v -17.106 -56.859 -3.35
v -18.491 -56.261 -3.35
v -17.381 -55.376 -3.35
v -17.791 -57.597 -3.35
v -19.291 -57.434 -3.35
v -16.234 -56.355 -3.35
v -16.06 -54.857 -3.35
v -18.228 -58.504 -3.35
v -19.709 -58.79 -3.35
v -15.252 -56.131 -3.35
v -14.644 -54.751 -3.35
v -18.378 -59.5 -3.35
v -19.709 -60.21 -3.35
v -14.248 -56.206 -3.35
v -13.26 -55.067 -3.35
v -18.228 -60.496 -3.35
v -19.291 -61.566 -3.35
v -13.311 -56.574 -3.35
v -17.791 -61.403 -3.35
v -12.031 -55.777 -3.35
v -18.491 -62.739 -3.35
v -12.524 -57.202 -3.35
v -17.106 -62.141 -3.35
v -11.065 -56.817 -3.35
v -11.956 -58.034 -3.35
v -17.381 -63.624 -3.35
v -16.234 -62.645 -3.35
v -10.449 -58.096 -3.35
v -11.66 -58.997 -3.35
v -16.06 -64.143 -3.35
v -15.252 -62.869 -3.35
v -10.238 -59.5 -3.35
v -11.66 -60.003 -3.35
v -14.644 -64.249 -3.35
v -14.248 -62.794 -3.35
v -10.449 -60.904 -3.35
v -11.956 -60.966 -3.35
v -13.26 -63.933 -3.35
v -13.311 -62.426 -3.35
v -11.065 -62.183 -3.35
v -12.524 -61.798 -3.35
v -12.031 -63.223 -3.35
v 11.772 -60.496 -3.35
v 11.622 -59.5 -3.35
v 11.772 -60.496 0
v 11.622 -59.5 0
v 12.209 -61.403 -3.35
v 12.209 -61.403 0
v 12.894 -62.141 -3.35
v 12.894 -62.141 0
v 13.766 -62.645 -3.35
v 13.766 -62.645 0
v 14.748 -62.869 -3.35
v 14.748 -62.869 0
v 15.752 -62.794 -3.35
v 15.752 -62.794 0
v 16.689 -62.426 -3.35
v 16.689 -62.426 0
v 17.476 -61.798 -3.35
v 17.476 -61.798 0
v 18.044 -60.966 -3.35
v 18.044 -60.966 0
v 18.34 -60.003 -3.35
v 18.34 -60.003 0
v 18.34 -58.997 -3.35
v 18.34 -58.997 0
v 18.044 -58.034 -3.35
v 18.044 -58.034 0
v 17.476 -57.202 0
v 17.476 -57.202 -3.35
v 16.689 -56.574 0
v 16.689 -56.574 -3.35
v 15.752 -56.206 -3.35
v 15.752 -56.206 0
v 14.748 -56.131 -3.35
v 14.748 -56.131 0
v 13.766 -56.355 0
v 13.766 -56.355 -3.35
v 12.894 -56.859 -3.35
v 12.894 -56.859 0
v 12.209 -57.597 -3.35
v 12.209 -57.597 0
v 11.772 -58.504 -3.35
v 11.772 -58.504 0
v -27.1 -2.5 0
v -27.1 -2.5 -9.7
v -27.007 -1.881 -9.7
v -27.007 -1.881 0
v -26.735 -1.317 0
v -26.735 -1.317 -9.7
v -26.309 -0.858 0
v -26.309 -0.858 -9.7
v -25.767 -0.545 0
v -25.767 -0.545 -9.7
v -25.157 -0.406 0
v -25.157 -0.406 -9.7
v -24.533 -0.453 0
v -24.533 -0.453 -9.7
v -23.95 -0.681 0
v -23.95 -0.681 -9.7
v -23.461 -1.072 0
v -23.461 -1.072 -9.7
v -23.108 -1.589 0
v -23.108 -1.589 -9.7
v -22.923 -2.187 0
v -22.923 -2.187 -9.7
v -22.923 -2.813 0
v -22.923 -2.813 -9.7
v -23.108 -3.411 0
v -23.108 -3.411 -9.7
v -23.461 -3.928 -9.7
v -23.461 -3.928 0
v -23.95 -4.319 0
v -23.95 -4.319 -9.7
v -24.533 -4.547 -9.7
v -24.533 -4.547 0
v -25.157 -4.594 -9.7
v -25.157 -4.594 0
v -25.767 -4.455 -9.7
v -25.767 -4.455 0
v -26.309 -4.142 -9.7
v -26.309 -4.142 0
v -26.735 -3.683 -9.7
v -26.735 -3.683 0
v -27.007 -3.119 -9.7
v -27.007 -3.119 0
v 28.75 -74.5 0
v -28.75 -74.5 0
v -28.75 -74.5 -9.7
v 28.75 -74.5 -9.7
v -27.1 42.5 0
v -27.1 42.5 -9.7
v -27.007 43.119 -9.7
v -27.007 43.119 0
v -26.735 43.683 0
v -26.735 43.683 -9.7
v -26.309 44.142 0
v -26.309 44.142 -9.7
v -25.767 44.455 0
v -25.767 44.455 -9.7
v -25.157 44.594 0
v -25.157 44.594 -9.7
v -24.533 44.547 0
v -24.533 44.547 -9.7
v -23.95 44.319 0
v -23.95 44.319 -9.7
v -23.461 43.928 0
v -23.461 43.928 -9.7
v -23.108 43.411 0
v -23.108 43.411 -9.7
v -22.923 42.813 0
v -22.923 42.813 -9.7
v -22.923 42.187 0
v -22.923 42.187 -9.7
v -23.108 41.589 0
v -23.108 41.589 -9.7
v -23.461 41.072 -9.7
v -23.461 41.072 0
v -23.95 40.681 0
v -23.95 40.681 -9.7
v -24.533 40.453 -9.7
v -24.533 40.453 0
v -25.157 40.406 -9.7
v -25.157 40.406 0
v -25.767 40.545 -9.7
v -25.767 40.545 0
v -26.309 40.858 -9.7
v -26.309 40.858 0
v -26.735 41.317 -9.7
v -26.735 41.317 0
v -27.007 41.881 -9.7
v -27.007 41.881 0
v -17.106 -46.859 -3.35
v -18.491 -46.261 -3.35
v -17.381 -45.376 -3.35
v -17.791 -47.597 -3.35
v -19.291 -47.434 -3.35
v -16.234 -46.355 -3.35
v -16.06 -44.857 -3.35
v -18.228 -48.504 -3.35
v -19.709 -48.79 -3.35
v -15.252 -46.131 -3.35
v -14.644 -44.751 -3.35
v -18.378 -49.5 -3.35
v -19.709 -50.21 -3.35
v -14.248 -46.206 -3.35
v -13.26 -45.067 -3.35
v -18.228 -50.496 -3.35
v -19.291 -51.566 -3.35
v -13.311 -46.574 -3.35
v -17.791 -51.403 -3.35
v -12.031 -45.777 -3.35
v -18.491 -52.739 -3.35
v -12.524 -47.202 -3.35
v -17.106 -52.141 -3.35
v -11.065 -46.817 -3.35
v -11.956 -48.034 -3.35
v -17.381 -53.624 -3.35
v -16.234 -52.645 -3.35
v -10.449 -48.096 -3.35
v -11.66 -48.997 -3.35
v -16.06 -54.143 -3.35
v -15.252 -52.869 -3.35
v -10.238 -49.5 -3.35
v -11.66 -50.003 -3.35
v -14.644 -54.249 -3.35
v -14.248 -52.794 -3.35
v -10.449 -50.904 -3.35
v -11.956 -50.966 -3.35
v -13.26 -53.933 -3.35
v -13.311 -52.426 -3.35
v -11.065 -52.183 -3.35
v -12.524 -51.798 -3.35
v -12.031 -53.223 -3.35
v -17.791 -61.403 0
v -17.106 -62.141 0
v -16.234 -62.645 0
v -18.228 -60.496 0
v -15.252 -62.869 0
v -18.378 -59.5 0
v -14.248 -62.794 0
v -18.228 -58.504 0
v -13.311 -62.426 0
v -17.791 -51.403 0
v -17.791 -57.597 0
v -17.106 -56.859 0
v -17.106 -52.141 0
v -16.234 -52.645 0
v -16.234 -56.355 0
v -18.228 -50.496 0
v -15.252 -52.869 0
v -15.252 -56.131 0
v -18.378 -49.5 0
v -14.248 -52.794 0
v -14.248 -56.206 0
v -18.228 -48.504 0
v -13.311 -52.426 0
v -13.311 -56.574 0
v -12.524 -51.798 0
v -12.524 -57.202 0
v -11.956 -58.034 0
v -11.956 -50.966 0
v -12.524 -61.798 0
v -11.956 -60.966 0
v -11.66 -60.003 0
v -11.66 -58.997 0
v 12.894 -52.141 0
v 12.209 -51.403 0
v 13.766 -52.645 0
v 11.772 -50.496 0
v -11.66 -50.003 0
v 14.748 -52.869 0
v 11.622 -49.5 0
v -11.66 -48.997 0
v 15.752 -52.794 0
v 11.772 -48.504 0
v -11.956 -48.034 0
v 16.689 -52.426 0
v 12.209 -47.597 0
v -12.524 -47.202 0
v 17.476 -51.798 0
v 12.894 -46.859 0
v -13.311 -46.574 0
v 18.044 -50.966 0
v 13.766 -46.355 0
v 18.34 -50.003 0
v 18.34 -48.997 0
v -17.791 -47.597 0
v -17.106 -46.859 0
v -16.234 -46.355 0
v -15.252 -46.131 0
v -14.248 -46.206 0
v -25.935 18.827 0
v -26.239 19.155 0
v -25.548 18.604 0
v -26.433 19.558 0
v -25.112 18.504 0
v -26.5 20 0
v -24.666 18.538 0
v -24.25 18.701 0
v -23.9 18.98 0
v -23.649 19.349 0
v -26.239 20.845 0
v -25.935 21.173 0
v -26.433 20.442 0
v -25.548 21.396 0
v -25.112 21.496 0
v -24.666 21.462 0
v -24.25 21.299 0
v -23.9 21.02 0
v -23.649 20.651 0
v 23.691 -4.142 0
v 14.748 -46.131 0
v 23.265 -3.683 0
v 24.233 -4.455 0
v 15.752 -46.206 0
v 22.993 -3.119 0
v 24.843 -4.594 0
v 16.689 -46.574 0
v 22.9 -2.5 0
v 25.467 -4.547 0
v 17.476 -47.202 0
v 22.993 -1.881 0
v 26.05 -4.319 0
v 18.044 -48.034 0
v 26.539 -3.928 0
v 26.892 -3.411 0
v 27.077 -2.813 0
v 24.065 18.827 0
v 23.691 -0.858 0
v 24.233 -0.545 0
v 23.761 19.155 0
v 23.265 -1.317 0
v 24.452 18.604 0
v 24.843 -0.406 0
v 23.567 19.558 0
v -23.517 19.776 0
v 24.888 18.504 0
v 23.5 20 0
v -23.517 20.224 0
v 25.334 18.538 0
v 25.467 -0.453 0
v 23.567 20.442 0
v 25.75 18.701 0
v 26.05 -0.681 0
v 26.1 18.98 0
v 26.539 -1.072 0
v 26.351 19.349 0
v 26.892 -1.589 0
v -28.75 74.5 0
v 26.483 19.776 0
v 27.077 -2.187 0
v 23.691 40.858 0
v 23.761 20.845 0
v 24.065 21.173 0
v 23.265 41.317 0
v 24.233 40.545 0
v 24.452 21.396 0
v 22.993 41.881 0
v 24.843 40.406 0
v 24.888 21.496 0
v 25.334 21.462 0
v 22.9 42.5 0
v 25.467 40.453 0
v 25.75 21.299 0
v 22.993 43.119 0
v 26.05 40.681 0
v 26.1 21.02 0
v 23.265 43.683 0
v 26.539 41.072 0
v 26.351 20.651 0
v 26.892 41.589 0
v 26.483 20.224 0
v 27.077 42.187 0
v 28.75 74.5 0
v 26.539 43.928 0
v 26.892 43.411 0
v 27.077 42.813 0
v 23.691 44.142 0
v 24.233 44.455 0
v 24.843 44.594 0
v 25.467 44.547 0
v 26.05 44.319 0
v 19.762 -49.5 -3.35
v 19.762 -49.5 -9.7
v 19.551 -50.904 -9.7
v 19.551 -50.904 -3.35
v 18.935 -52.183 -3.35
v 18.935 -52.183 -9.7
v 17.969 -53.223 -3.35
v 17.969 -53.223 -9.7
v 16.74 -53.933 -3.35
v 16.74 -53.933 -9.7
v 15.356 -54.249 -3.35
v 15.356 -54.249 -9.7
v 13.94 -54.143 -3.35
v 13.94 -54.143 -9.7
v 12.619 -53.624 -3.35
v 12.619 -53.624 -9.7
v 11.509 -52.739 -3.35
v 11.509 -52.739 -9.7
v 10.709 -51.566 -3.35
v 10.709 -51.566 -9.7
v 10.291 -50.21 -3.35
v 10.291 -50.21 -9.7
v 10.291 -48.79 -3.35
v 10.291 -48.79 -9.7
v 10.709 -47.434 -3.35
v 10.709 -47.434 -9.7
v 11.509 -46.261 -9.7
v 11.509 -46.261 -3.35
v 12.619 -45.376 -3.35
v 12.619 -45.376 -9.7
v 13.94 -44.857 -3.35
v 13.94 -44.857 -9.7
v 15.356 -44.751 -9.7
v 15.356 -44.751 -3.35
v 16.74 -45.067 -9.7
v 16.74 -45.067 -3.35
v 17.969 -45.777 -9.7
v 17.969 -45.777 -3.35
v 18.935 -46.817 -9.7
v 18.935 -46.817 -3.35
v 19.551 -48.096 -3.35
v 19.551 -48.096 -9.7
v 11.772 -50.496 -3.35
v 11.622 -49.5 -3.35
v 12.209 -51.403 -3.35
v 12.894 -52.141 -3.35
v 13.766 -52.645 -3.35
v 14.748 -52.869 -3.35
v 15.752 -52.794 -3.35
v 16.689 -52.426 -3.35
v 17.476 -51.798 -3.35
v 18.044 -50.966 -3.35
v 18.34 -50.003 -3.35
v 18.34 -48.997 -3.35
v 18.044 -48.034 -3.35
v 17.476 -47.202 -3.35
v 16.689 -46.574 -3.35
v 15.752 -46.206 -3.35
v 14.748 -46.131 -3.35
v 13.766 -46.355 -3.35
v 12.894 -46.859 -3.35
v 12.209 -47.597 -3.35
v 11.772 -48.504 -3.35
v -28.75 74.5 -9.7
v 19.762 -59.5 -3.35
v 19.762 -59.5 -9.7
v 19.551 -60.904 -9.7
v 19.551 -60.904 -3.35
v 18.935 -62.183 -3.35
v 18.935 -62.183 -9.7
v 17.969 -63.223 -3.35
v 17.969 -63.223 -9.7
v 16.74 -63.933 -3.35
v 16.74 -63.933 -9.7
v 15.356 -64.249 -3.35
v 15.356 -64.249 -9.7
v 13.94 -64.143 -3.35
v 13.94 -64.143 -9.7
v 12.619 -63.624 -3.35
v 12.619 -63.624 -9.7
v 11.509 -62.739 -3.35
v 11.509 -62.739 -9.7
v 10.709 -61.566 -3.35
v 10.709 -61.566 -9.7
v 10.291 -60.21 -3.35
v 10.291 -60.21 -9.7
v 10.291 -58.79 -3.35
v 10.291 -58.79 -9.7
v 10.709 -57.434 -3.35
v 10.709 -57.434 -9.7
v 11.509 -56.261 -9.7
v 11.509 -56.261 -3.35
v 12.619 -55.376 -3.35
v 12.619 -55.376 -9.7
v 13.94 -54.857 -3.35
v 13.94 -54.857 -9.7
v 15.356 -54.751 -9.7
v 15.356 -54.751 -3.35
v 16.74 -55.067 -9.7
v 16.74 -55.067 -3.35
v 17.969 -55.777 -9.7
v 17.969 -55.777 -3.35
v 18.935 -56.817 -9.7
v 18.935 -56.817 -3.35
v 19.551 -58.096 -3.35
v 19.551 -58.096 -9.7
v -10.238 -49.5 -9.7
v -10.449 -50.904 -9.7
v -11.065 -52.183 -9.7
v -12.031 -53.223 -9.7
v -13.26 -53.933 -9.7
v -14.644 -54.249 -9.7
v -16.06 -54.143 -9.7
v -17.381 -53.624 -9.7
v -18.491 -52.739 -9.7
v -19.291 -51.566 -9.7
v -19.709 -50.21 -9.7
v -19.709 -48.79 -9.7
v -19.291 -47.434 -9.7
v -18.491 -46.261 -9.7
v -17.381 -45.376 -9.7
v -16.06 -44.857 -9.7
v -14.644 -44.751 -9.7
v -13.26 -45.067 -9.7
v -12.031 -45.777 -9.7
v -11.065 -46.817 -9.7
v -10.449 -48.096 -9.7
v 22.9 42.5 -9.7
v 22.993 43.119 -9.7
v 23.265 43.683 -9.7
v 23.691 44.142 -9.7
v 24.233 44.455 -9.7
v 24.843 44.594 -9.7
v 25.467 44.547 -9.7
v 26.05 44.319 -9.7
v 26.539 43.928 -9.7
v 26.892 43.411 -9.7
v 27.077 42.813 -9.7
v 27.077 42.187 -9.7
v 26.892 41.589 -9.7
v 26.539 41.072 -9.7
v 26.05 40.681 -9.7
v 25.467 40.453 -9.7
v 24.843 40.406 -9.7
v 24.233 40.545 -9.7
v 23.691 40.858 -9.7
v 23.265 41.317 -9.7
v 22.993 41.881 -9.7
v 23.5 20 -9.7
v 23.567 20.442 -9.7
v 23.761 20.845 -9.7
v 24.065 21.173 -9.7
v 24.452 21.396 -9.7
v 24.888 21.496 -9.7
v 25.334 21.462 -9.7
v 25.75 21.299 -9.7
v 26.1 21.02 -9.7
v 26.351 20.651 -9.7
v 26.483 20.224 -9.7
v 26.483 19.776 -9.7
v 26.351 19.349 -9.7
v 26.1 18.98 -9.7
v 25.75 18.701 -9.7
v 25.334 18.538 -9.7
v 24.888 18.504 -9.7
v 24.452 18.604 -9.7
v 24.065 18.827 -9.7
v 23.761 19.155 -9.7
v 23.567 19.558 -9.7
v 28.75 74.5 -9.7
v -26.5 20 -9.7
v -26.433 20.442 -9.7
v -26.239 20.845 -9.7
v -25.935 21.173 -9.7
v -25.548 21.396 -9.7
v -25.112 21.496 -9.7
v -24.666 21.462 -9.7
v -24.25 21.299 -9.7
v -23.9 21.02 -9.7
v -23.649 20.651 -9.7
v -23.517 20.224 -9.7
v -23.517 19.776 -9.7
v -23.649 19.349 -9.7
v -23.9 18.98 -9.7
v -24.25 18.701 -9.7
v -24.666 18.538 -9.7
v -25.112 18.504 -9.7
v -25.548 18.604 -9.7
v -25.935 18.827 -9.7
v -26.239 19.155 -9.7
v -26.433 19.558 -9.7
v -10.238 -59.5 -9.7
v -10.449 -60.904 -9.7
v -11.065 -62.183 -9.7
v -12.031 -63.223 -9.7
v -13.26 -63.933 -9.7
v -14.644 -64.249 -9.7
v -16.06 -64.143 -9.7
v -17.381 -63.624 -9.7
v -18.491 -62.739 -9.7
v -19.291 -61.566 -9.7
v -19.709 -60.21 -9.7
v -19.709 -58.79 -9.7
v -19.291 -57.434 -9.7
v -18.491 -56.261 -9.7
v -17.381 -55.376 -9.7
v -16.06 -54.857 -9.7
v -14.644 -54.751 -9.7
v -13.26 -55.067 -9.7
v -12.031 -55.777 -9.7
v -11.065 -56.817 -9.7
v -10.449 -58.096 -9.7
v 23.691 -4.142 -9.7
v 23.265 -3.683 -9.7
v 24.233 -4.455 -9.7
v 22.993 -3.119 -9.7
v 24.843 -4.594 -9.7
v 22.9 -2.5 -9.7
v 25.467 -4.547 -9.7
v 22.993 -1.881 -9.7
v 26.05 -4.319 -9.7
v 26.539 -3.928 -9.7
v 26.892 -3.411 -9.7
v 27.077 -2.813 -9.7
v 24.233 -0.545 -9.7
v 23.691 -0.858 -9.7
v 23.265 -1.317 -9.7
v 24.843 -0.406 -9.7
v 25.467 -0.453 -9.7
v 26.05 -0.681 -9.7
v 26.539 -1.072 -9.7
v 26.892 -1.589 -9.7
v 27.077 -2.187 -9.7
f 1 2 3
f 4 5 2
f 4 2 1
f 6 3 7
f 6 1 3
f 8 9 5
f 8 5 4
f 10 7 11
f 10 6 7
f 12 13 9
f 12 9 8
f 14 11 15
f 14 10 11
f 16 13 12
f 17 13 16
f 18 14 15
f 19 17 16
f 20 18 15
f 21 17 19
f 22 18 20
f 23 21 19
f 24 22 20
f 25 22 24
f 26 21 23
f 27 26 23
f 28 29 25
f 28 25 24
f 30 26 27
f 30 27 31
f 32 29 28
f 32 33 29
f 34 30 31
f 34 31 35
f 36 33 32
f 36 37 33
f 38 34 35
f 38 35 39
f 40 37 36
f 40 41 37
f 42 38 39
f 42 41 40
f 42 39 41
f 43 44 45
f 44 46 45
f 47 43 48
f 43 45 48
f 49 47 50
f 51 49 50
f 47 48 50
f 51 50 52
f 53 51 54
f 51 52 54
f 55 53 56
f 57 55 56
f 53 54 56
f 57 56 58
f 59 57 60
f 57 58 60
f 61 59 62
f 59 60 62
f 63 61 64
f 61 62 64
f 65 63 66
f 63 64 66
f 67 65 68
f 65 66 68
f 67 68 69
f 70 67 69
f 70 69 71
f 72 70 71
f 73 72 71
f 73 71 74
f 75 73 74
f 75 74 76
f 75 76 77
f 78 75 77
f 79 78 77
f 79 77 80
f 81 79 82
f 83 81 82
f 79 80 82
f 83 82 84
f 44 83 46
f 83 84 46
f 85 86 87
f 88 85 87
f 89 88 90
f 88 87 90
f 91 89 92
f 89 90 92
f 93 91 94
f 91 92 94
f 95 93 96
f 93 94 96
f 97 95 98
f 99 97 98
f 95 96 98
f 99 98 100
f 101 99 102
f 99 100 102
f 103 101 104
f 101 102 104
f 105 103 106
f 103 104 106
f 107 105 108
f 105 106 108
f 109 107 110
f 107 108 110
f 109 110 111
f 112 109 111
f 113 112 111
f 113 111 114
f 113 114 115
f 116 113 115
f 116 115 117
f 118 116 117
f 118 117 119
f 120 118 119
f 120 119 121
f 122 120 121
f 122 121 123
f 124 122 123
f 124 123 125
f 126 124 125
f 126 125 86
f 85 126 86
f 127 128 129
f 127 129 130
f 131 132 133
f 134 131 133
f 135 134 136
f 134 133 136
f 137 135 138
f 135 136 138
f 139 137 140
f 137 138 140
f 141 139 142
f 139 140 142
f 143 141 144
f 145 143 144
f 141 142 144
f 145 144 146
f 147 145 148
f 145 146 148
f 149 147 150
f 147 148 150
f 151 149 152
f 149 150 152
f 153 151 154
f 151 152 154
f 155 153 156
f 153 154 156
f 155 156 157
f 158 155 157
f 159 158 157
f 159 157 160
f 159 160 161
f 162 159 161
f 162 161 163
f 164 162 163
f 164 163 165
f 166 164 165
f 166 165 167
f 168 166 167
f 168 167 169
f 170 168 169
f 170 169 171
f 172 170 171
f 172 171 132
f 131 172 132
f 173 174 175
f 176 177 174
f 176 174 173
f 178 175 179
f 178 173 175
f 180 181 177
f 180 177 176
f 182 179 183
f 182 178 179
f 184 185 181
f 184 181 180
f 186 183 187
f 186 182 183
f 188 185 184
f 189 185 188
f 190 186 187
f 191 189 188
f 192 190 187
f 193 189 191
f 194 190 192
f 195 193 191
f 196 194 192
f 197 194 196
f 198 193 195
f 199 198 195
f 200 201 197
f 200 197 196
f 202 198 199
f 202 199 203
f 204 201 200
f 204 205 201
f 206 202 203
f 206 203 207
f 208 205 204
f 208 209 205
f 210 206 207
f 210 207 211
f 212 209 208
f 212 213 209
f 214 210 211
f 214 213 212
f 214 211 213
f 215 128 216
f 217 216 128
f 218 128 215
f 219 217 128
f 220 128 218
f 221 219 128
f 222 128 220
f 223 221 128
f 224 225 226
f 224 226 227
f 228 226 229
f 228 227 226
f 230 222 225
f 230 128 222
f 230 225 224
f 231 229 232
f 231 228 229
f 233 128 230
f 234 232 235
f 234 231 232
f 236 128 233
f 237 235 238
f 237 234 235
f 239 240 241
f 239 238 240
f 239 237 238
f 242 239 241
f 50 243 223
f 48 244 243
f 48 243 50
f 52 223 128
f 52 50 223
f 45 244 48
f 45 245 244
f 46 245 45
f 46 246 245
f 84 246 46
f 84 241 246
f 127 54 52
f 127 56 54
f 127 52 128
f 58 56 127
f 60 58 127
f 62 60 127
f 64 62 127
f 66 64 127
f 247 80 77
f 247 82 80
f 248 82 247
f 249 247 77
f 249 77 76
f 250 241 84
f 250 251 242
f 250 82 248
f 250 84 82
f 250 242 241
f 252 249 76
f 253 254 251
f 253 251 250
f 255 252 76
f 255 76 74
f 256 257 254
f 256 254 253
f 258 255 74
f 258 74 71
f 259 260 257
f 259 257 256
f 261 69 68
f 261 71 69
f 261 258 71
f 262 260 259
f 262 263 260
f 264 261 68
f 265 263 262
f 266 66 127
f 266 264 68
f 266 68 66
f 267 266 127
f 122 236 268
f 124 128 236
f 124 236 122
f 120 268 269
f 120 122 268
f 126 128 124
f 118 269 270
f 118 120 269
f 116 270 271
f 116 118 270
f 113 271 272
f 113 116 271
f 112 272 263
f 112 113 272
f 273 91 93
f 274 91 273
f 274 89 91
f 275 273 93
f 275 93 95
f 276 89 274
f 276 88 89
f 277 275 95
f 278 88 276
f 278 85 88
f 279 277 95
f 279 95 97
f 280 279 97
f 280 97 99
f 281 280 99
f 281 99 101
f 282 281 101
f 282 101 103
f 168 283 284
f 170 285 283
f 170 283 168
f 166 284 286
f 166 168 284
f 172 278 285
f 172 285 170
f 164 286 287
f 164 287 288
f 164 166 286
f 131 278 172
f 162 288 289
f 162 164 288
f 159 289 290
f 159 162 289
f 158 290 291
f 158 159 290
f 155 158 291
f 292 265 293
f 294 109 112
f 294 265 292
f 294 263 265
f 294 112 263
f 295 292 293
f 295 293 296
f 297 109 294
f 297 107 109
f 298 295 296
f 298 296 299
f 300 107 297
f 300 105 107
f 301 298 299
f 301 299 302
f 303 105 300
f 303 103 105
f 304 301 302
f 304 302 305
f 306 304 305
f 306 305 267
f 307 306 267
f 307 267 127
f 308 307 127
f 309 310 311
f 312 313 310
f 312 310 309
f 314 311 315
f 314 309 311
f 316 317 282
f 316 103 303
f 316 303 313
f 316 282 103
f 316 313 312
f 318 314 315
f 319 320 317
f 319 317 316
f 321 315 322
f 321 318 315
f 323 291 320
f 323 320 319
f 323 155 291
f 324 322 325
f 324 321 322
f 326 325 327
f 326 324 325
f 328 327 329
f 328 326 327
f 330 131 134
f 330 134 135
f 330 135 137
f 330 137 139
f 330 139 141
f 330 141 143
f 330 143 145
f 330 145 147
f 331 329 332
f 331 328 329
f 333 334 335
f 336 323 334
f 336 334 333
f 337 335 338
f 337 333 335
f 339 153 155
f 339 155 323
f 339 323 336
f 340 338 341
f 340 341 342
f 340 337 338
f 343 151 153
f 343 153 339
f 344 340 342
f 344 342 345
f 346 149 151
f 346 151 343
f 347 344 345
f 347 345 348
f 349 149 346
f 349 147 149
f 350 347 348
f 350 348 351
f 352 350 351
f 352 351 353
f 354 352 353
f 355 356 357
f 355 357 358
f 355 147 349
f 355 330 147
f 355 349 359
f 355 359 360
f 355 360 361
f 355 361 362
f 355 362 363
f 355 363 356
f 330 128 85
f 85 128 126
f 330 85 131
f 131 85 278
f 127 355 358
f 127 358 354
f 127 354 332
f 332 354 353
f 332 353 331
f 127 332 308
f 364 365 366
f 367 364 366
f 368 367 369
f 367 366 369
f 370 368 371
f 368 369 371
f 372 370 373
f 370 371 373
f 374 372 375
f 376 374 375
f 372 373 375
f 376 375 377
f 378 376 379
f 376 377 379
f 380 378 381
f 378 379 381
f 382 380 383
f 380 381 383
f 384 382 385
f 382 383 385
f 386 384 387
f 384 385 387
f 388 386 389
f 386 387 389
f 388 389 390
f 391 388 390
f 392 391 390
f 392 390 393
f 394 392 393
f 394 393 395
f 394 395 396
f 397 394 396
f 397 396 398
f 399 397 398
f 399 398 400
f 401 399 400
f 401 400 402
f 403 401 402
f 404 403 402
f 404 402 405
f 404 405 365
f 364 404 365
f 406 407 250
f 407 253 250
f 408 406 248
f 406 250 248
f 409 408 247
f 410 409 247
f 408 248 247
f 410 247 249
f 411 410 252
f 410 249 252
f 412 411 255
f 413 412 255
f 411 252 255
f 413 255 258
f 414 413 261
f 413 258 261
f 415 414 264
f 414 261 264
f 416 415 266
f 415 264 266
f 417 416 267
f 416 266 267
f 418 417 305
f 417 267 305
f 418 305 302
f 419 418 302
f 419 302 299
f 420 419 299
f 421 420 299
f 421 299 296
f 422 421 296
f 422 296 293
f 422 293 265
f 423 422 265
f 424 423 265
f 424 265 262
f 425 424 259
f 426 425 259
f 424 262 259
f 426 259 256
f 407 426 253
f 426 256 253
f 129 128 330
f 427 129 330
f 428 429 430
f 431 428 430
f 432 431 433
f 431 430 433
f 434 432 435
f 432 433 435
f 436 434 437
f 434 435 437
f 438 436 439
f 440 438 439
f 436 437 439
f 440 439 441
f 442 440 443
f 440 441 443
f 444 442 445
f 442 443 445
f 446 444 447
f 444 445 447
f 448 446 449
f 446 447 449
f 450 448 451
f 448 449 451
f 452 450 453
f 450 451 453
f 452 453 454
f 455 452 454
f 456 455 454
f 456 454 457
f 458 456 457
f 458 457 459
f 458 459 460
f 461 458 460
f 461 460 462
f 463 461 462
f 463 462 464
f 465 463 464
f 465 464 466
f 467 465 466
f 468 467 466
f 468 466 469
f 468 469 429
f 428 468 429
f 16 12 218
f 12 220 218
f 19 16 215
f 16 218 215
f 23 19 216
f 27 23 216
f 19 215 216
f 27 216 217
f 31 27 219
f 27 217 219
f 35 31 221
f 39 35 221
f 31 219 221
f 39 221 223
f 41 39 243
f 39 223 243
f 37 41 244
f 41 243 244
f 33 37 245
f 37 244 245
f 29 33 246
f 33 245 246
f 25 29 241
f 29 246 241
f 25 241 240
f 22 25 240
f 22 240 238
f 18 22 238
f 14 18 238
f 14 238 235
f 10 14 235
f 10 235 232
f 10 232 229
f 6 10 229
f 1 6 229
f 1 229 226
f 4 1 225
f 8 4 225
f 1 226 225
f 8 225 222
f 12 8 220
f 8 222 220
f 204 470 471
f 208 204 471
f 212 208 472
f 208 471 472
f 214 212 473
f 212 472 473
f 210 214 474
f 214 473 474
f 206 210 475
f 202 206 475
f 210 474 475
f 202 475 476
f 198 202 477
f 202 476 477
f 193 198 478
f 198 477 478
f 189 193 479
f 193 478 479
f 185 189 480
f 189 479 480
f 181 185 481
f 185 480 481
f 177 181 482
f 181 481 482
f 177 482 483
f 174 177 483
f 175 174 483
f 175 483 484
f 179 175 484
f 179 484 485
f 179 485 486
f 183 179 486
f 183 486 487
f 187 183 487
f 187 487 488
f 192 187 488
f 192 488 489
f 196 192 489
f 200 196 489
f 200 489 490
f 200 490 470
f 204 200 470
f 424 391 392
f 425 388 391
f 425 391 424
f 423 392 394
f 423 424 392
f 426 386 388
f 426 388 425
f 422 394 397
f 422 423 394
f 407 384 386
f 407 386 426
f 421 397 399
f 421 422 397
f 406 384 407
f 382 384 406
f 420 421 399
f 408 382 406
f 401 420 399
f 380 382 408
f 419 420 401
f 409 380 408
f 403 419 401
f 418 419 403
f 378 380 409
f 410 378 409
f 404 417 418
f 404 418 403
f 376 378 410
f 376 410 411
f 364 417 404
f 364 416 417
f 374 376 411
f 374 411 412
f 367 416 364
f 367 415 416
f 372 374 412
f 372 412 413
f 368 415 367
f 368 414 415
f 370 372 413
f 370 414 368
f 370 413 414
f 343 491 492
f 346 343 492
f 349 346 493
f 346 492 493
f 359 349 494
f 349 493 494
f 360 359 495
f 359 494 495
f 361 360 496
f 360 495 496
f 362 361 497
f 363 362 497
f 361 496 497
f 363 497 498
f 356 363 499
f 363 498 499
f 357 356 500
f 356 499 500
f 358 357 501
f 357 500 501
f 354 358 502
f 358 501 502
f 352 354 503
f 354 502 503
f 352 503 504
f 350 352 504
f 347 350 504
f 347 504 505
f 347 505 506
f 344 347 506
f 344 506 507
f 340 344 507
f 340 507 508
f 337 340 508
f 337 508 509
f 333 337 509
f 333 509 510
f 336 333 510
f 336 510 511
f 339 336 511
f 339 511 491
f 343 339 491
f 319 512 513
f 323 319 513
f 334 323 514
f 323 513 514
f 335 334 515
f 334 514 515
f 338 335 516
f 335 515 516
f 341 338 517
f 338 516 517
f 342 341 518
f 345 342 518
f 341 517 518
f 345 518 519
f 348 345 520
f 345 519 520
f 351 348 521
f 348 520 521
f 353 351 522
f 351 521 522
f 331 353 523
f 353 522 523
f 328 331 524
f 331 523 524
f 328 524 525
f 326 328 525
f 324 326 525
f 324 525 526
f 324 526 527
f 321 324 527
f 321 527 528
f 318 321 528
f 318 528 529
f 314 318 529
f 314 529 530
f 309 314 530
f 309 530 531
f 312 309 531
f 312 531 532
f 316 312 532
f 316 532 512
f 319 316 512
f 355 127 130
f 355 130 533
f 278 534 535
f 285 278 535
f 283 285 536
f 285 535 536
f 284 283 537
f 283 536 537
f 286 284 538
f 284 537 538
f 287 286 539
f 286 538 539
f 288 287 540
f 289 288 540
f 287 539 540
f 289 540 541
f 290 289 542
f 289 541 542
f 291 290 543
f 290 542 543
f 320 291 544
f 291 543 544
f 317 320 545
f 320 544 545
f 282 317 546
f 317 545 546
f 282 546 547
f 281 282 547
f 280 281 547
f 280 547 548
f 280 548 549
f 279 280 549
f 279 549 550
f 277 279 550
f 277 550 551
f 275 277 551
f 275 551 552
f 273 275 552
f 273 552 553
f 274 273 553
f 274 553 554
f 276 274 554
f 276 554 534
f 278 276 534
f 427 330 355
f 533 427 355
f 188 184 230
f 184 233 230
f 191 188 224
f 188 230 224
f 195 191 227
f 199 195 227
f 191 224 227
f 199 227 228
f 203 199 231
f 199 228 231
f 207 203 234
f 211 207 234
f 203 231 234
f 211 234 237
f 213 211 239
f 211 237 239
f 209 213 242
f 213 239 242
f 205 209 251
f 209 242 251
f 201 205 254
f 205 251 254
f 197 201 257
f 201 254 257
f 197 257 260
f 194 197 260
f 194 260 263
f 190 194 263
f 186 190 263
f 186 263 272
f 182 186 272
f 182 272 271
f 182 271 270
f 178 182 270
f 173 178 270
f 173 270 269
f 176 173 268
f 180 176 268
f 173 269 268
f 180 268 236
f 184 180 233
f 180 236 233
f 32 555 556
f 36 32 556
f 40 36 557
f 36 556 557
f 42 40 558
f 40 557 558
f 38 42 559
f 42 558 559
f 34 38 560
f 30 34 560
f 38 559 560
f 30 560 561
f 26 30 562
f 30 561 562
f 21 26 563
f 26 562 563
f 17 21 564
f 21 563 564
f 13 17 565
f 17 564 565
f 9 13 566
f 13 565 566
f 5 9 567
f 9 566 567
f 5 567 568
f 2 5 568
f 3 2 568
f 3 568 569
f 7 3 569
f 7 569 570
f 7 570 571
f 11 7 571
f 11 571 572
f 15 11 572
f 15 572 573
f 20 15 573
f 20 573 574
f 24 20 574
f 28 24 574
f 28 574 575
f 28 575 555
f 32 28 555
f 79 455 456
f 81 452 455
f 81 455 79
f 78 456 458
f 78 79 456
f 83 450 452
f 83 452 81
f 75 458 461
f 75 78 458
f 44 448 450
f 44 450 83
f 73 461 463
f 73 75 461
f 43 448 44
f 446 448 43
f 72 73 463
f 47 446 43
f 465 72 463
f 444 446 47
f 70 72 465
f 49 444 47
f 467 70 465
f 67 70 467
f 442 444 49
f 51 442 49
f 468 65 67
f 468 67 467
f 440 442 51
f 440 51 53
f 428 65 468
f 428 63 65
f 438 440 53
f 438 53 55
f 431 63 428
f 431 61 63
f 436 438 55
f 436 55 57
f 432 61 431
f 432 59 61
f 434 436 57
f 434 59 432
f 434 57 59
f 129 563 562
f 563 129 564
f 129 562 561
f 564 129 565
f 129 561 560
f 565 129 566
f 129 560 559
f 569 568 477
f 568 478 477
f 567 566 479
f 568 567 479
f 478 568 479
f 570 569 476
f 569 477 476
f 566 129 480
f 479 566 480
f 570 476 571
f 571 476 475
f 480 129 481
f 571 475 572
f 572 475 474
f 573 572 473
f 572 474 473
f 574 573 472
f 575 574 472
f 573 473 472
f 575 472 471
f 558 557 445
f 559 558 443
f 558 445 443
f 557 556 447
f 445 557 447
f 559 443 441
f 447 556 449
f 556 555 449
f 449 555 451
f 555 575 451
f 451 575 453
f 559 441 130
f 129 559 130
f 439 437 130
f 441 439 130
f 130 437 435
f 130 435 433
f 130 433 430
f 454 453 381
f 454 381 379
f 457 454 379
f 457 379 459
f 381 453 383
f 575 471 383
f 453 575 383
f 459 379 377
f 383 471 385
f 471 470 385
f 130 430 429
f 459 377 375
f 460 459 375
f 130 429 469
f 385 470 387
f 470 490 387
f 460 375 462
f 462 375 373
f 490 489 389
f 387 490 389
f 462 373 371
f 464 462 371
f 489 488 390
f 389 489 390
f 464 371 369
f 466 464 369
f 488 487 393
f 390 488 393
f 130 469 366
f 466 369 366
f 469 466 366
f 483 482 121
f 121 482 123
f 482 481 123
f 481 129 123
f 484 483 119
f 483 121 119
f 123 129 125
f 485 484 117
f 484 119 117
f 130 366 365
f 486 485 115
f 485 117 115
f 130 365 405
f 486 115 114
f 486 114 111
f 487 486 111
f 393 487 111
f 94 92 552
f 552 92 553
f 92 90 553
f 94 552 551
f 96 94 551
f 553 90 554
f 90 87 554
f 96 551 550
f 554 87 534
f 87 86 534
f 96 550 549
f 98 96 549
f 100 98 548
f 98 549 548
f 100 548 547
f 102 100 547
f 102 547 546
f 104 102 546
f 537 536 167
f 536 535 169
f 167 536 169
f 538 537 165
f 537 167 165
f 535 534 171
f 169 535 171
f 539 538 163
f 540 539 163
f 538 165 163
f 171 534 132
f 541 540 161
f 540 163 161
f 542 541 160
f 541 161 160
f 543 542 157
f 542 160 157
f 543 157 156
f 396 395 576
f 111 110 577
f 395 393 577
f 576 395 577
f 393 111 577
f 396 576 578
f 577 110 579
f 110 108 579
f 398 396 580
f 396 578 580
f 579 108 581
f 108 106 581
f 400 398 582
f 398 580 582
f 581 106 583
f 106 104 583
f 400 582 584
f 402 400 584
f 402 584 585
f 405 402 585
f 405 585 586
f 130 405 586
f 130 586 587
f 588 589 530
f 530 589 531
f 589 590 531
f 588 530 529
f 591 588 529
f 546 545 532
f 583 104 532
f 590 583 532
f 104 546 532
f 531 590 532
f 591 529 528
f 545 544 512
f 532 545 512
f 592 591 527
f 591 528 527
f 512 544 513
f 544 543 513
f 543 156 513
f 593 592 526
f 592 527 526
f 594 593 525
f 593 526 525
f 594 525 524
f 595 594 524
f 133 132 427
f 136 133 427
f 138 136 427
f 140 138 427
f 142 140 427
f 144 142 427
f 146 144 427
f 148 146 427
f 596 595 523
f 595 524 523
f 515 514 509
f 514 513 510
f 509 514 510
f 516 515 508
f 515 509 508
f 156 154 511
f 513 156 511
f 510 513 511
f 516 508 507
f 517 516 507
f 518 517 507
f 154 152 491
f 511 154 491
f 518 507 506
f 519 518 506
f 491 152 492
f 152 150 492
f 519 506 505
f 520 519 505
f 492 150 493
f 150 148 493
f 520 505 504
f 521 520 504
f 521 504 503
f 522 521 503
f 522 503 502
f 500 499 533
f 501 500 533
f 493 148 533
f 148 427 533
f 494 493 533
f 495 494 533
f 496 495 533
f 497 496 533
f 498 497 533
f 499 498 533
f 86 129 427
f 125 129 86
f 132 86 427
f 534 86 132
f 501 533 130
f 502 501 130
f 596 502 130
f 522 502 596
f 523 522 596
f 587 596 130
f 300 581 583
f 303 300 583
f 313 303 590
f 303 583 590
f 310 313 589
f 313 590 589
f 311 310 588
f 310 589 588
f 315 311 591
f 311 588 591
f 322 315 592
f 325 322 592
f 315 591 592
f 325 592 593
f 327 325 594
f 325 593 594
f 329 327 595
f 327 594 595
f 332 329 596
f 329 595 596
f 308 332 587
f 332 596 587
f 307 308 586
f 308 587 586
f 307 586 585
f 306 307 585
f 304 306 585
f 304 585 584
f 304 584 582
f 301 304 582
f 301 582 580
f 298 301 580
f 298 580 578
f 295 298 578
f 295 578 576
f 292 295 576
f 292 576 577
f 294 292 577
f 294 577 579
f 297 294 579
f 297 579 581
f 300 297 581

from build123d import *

# Parameters (mm, degrees)
F0_W           = 57.5
F0_H           = 149
F1_DEPTH       = 9.7
F2_D           = 4.2
F3_D           = 3
F5_D           = 6.7564
F5_DEPTH       = 20
F5_CBORE_D     = 9.525
F5_CBORE_DEPTH = 6.35
F5_TIP         = 2.0298273432
F6_D           = 6.7564
F6_DEPTH       = 20
F6_CBORE_D     = 9.525
F6_CBORE_DEPTH = 6.35
F6_TIP         = 2.0298273432


with BuildPart() as f1:
    # F0 (on Top) → F1 (new body)
    with BuildSketch(Plane.XY):
        Rectangle(F0_W, F0_H)
    extrude(amount=-F1_DEPTH)

    # F2 (through all)
    with Locations(Plane.XY):
        with Locations((-25, 42.5), (25, 42.5), (-25, -2.5), (25, -2.5)):
            Hole(F2_D / 2)

    # F3 (through all)
    with Locations(Plane.XY):
        with Locations((-25, 20), (25, 20)):
            Hole(F3_D / 2)

    # F5
    with Locations(Plane(origin=(0, 0, -9.7), x_dir=(1, 0, 0), z_dir=(0, 0, -1))):
        with Locations((-15, 49.5), (15, 49.5)):
            CounterBoreHole(F5_D / 2, F5_CBORE_D / 2, F5_CBORE_DEPTH, depth=F5_DEPTH)
            with Locations((0, 0, -(F5_DEPTH + F5_TIP / 2))):  # 118° drill point
                Cone(0, F5_D / 2, F5_TIP, mode=Mode.SUBTRACT)

    # F6
    with Locations(Plane(origin=(0, 0, -9.7), x_dir=(1, 0, 0), z_dir=(0, 0, -1))):
        with Locations((-15, 59.5), (15, 59.5)):
            CounterBoreHole(F6_D / 2, F6_CBORE_D / 2, F6_CBORE_DEPTH, depth=F6_DEPTH)
            with Locations((0, 0, -(F6_DEPTH + F6_TIP / 2))):  # 118° drill point
                Cone(0, F6_D / 2, F6_TIP, mode=Mode.SUBTRACT)


solid = f1.part
